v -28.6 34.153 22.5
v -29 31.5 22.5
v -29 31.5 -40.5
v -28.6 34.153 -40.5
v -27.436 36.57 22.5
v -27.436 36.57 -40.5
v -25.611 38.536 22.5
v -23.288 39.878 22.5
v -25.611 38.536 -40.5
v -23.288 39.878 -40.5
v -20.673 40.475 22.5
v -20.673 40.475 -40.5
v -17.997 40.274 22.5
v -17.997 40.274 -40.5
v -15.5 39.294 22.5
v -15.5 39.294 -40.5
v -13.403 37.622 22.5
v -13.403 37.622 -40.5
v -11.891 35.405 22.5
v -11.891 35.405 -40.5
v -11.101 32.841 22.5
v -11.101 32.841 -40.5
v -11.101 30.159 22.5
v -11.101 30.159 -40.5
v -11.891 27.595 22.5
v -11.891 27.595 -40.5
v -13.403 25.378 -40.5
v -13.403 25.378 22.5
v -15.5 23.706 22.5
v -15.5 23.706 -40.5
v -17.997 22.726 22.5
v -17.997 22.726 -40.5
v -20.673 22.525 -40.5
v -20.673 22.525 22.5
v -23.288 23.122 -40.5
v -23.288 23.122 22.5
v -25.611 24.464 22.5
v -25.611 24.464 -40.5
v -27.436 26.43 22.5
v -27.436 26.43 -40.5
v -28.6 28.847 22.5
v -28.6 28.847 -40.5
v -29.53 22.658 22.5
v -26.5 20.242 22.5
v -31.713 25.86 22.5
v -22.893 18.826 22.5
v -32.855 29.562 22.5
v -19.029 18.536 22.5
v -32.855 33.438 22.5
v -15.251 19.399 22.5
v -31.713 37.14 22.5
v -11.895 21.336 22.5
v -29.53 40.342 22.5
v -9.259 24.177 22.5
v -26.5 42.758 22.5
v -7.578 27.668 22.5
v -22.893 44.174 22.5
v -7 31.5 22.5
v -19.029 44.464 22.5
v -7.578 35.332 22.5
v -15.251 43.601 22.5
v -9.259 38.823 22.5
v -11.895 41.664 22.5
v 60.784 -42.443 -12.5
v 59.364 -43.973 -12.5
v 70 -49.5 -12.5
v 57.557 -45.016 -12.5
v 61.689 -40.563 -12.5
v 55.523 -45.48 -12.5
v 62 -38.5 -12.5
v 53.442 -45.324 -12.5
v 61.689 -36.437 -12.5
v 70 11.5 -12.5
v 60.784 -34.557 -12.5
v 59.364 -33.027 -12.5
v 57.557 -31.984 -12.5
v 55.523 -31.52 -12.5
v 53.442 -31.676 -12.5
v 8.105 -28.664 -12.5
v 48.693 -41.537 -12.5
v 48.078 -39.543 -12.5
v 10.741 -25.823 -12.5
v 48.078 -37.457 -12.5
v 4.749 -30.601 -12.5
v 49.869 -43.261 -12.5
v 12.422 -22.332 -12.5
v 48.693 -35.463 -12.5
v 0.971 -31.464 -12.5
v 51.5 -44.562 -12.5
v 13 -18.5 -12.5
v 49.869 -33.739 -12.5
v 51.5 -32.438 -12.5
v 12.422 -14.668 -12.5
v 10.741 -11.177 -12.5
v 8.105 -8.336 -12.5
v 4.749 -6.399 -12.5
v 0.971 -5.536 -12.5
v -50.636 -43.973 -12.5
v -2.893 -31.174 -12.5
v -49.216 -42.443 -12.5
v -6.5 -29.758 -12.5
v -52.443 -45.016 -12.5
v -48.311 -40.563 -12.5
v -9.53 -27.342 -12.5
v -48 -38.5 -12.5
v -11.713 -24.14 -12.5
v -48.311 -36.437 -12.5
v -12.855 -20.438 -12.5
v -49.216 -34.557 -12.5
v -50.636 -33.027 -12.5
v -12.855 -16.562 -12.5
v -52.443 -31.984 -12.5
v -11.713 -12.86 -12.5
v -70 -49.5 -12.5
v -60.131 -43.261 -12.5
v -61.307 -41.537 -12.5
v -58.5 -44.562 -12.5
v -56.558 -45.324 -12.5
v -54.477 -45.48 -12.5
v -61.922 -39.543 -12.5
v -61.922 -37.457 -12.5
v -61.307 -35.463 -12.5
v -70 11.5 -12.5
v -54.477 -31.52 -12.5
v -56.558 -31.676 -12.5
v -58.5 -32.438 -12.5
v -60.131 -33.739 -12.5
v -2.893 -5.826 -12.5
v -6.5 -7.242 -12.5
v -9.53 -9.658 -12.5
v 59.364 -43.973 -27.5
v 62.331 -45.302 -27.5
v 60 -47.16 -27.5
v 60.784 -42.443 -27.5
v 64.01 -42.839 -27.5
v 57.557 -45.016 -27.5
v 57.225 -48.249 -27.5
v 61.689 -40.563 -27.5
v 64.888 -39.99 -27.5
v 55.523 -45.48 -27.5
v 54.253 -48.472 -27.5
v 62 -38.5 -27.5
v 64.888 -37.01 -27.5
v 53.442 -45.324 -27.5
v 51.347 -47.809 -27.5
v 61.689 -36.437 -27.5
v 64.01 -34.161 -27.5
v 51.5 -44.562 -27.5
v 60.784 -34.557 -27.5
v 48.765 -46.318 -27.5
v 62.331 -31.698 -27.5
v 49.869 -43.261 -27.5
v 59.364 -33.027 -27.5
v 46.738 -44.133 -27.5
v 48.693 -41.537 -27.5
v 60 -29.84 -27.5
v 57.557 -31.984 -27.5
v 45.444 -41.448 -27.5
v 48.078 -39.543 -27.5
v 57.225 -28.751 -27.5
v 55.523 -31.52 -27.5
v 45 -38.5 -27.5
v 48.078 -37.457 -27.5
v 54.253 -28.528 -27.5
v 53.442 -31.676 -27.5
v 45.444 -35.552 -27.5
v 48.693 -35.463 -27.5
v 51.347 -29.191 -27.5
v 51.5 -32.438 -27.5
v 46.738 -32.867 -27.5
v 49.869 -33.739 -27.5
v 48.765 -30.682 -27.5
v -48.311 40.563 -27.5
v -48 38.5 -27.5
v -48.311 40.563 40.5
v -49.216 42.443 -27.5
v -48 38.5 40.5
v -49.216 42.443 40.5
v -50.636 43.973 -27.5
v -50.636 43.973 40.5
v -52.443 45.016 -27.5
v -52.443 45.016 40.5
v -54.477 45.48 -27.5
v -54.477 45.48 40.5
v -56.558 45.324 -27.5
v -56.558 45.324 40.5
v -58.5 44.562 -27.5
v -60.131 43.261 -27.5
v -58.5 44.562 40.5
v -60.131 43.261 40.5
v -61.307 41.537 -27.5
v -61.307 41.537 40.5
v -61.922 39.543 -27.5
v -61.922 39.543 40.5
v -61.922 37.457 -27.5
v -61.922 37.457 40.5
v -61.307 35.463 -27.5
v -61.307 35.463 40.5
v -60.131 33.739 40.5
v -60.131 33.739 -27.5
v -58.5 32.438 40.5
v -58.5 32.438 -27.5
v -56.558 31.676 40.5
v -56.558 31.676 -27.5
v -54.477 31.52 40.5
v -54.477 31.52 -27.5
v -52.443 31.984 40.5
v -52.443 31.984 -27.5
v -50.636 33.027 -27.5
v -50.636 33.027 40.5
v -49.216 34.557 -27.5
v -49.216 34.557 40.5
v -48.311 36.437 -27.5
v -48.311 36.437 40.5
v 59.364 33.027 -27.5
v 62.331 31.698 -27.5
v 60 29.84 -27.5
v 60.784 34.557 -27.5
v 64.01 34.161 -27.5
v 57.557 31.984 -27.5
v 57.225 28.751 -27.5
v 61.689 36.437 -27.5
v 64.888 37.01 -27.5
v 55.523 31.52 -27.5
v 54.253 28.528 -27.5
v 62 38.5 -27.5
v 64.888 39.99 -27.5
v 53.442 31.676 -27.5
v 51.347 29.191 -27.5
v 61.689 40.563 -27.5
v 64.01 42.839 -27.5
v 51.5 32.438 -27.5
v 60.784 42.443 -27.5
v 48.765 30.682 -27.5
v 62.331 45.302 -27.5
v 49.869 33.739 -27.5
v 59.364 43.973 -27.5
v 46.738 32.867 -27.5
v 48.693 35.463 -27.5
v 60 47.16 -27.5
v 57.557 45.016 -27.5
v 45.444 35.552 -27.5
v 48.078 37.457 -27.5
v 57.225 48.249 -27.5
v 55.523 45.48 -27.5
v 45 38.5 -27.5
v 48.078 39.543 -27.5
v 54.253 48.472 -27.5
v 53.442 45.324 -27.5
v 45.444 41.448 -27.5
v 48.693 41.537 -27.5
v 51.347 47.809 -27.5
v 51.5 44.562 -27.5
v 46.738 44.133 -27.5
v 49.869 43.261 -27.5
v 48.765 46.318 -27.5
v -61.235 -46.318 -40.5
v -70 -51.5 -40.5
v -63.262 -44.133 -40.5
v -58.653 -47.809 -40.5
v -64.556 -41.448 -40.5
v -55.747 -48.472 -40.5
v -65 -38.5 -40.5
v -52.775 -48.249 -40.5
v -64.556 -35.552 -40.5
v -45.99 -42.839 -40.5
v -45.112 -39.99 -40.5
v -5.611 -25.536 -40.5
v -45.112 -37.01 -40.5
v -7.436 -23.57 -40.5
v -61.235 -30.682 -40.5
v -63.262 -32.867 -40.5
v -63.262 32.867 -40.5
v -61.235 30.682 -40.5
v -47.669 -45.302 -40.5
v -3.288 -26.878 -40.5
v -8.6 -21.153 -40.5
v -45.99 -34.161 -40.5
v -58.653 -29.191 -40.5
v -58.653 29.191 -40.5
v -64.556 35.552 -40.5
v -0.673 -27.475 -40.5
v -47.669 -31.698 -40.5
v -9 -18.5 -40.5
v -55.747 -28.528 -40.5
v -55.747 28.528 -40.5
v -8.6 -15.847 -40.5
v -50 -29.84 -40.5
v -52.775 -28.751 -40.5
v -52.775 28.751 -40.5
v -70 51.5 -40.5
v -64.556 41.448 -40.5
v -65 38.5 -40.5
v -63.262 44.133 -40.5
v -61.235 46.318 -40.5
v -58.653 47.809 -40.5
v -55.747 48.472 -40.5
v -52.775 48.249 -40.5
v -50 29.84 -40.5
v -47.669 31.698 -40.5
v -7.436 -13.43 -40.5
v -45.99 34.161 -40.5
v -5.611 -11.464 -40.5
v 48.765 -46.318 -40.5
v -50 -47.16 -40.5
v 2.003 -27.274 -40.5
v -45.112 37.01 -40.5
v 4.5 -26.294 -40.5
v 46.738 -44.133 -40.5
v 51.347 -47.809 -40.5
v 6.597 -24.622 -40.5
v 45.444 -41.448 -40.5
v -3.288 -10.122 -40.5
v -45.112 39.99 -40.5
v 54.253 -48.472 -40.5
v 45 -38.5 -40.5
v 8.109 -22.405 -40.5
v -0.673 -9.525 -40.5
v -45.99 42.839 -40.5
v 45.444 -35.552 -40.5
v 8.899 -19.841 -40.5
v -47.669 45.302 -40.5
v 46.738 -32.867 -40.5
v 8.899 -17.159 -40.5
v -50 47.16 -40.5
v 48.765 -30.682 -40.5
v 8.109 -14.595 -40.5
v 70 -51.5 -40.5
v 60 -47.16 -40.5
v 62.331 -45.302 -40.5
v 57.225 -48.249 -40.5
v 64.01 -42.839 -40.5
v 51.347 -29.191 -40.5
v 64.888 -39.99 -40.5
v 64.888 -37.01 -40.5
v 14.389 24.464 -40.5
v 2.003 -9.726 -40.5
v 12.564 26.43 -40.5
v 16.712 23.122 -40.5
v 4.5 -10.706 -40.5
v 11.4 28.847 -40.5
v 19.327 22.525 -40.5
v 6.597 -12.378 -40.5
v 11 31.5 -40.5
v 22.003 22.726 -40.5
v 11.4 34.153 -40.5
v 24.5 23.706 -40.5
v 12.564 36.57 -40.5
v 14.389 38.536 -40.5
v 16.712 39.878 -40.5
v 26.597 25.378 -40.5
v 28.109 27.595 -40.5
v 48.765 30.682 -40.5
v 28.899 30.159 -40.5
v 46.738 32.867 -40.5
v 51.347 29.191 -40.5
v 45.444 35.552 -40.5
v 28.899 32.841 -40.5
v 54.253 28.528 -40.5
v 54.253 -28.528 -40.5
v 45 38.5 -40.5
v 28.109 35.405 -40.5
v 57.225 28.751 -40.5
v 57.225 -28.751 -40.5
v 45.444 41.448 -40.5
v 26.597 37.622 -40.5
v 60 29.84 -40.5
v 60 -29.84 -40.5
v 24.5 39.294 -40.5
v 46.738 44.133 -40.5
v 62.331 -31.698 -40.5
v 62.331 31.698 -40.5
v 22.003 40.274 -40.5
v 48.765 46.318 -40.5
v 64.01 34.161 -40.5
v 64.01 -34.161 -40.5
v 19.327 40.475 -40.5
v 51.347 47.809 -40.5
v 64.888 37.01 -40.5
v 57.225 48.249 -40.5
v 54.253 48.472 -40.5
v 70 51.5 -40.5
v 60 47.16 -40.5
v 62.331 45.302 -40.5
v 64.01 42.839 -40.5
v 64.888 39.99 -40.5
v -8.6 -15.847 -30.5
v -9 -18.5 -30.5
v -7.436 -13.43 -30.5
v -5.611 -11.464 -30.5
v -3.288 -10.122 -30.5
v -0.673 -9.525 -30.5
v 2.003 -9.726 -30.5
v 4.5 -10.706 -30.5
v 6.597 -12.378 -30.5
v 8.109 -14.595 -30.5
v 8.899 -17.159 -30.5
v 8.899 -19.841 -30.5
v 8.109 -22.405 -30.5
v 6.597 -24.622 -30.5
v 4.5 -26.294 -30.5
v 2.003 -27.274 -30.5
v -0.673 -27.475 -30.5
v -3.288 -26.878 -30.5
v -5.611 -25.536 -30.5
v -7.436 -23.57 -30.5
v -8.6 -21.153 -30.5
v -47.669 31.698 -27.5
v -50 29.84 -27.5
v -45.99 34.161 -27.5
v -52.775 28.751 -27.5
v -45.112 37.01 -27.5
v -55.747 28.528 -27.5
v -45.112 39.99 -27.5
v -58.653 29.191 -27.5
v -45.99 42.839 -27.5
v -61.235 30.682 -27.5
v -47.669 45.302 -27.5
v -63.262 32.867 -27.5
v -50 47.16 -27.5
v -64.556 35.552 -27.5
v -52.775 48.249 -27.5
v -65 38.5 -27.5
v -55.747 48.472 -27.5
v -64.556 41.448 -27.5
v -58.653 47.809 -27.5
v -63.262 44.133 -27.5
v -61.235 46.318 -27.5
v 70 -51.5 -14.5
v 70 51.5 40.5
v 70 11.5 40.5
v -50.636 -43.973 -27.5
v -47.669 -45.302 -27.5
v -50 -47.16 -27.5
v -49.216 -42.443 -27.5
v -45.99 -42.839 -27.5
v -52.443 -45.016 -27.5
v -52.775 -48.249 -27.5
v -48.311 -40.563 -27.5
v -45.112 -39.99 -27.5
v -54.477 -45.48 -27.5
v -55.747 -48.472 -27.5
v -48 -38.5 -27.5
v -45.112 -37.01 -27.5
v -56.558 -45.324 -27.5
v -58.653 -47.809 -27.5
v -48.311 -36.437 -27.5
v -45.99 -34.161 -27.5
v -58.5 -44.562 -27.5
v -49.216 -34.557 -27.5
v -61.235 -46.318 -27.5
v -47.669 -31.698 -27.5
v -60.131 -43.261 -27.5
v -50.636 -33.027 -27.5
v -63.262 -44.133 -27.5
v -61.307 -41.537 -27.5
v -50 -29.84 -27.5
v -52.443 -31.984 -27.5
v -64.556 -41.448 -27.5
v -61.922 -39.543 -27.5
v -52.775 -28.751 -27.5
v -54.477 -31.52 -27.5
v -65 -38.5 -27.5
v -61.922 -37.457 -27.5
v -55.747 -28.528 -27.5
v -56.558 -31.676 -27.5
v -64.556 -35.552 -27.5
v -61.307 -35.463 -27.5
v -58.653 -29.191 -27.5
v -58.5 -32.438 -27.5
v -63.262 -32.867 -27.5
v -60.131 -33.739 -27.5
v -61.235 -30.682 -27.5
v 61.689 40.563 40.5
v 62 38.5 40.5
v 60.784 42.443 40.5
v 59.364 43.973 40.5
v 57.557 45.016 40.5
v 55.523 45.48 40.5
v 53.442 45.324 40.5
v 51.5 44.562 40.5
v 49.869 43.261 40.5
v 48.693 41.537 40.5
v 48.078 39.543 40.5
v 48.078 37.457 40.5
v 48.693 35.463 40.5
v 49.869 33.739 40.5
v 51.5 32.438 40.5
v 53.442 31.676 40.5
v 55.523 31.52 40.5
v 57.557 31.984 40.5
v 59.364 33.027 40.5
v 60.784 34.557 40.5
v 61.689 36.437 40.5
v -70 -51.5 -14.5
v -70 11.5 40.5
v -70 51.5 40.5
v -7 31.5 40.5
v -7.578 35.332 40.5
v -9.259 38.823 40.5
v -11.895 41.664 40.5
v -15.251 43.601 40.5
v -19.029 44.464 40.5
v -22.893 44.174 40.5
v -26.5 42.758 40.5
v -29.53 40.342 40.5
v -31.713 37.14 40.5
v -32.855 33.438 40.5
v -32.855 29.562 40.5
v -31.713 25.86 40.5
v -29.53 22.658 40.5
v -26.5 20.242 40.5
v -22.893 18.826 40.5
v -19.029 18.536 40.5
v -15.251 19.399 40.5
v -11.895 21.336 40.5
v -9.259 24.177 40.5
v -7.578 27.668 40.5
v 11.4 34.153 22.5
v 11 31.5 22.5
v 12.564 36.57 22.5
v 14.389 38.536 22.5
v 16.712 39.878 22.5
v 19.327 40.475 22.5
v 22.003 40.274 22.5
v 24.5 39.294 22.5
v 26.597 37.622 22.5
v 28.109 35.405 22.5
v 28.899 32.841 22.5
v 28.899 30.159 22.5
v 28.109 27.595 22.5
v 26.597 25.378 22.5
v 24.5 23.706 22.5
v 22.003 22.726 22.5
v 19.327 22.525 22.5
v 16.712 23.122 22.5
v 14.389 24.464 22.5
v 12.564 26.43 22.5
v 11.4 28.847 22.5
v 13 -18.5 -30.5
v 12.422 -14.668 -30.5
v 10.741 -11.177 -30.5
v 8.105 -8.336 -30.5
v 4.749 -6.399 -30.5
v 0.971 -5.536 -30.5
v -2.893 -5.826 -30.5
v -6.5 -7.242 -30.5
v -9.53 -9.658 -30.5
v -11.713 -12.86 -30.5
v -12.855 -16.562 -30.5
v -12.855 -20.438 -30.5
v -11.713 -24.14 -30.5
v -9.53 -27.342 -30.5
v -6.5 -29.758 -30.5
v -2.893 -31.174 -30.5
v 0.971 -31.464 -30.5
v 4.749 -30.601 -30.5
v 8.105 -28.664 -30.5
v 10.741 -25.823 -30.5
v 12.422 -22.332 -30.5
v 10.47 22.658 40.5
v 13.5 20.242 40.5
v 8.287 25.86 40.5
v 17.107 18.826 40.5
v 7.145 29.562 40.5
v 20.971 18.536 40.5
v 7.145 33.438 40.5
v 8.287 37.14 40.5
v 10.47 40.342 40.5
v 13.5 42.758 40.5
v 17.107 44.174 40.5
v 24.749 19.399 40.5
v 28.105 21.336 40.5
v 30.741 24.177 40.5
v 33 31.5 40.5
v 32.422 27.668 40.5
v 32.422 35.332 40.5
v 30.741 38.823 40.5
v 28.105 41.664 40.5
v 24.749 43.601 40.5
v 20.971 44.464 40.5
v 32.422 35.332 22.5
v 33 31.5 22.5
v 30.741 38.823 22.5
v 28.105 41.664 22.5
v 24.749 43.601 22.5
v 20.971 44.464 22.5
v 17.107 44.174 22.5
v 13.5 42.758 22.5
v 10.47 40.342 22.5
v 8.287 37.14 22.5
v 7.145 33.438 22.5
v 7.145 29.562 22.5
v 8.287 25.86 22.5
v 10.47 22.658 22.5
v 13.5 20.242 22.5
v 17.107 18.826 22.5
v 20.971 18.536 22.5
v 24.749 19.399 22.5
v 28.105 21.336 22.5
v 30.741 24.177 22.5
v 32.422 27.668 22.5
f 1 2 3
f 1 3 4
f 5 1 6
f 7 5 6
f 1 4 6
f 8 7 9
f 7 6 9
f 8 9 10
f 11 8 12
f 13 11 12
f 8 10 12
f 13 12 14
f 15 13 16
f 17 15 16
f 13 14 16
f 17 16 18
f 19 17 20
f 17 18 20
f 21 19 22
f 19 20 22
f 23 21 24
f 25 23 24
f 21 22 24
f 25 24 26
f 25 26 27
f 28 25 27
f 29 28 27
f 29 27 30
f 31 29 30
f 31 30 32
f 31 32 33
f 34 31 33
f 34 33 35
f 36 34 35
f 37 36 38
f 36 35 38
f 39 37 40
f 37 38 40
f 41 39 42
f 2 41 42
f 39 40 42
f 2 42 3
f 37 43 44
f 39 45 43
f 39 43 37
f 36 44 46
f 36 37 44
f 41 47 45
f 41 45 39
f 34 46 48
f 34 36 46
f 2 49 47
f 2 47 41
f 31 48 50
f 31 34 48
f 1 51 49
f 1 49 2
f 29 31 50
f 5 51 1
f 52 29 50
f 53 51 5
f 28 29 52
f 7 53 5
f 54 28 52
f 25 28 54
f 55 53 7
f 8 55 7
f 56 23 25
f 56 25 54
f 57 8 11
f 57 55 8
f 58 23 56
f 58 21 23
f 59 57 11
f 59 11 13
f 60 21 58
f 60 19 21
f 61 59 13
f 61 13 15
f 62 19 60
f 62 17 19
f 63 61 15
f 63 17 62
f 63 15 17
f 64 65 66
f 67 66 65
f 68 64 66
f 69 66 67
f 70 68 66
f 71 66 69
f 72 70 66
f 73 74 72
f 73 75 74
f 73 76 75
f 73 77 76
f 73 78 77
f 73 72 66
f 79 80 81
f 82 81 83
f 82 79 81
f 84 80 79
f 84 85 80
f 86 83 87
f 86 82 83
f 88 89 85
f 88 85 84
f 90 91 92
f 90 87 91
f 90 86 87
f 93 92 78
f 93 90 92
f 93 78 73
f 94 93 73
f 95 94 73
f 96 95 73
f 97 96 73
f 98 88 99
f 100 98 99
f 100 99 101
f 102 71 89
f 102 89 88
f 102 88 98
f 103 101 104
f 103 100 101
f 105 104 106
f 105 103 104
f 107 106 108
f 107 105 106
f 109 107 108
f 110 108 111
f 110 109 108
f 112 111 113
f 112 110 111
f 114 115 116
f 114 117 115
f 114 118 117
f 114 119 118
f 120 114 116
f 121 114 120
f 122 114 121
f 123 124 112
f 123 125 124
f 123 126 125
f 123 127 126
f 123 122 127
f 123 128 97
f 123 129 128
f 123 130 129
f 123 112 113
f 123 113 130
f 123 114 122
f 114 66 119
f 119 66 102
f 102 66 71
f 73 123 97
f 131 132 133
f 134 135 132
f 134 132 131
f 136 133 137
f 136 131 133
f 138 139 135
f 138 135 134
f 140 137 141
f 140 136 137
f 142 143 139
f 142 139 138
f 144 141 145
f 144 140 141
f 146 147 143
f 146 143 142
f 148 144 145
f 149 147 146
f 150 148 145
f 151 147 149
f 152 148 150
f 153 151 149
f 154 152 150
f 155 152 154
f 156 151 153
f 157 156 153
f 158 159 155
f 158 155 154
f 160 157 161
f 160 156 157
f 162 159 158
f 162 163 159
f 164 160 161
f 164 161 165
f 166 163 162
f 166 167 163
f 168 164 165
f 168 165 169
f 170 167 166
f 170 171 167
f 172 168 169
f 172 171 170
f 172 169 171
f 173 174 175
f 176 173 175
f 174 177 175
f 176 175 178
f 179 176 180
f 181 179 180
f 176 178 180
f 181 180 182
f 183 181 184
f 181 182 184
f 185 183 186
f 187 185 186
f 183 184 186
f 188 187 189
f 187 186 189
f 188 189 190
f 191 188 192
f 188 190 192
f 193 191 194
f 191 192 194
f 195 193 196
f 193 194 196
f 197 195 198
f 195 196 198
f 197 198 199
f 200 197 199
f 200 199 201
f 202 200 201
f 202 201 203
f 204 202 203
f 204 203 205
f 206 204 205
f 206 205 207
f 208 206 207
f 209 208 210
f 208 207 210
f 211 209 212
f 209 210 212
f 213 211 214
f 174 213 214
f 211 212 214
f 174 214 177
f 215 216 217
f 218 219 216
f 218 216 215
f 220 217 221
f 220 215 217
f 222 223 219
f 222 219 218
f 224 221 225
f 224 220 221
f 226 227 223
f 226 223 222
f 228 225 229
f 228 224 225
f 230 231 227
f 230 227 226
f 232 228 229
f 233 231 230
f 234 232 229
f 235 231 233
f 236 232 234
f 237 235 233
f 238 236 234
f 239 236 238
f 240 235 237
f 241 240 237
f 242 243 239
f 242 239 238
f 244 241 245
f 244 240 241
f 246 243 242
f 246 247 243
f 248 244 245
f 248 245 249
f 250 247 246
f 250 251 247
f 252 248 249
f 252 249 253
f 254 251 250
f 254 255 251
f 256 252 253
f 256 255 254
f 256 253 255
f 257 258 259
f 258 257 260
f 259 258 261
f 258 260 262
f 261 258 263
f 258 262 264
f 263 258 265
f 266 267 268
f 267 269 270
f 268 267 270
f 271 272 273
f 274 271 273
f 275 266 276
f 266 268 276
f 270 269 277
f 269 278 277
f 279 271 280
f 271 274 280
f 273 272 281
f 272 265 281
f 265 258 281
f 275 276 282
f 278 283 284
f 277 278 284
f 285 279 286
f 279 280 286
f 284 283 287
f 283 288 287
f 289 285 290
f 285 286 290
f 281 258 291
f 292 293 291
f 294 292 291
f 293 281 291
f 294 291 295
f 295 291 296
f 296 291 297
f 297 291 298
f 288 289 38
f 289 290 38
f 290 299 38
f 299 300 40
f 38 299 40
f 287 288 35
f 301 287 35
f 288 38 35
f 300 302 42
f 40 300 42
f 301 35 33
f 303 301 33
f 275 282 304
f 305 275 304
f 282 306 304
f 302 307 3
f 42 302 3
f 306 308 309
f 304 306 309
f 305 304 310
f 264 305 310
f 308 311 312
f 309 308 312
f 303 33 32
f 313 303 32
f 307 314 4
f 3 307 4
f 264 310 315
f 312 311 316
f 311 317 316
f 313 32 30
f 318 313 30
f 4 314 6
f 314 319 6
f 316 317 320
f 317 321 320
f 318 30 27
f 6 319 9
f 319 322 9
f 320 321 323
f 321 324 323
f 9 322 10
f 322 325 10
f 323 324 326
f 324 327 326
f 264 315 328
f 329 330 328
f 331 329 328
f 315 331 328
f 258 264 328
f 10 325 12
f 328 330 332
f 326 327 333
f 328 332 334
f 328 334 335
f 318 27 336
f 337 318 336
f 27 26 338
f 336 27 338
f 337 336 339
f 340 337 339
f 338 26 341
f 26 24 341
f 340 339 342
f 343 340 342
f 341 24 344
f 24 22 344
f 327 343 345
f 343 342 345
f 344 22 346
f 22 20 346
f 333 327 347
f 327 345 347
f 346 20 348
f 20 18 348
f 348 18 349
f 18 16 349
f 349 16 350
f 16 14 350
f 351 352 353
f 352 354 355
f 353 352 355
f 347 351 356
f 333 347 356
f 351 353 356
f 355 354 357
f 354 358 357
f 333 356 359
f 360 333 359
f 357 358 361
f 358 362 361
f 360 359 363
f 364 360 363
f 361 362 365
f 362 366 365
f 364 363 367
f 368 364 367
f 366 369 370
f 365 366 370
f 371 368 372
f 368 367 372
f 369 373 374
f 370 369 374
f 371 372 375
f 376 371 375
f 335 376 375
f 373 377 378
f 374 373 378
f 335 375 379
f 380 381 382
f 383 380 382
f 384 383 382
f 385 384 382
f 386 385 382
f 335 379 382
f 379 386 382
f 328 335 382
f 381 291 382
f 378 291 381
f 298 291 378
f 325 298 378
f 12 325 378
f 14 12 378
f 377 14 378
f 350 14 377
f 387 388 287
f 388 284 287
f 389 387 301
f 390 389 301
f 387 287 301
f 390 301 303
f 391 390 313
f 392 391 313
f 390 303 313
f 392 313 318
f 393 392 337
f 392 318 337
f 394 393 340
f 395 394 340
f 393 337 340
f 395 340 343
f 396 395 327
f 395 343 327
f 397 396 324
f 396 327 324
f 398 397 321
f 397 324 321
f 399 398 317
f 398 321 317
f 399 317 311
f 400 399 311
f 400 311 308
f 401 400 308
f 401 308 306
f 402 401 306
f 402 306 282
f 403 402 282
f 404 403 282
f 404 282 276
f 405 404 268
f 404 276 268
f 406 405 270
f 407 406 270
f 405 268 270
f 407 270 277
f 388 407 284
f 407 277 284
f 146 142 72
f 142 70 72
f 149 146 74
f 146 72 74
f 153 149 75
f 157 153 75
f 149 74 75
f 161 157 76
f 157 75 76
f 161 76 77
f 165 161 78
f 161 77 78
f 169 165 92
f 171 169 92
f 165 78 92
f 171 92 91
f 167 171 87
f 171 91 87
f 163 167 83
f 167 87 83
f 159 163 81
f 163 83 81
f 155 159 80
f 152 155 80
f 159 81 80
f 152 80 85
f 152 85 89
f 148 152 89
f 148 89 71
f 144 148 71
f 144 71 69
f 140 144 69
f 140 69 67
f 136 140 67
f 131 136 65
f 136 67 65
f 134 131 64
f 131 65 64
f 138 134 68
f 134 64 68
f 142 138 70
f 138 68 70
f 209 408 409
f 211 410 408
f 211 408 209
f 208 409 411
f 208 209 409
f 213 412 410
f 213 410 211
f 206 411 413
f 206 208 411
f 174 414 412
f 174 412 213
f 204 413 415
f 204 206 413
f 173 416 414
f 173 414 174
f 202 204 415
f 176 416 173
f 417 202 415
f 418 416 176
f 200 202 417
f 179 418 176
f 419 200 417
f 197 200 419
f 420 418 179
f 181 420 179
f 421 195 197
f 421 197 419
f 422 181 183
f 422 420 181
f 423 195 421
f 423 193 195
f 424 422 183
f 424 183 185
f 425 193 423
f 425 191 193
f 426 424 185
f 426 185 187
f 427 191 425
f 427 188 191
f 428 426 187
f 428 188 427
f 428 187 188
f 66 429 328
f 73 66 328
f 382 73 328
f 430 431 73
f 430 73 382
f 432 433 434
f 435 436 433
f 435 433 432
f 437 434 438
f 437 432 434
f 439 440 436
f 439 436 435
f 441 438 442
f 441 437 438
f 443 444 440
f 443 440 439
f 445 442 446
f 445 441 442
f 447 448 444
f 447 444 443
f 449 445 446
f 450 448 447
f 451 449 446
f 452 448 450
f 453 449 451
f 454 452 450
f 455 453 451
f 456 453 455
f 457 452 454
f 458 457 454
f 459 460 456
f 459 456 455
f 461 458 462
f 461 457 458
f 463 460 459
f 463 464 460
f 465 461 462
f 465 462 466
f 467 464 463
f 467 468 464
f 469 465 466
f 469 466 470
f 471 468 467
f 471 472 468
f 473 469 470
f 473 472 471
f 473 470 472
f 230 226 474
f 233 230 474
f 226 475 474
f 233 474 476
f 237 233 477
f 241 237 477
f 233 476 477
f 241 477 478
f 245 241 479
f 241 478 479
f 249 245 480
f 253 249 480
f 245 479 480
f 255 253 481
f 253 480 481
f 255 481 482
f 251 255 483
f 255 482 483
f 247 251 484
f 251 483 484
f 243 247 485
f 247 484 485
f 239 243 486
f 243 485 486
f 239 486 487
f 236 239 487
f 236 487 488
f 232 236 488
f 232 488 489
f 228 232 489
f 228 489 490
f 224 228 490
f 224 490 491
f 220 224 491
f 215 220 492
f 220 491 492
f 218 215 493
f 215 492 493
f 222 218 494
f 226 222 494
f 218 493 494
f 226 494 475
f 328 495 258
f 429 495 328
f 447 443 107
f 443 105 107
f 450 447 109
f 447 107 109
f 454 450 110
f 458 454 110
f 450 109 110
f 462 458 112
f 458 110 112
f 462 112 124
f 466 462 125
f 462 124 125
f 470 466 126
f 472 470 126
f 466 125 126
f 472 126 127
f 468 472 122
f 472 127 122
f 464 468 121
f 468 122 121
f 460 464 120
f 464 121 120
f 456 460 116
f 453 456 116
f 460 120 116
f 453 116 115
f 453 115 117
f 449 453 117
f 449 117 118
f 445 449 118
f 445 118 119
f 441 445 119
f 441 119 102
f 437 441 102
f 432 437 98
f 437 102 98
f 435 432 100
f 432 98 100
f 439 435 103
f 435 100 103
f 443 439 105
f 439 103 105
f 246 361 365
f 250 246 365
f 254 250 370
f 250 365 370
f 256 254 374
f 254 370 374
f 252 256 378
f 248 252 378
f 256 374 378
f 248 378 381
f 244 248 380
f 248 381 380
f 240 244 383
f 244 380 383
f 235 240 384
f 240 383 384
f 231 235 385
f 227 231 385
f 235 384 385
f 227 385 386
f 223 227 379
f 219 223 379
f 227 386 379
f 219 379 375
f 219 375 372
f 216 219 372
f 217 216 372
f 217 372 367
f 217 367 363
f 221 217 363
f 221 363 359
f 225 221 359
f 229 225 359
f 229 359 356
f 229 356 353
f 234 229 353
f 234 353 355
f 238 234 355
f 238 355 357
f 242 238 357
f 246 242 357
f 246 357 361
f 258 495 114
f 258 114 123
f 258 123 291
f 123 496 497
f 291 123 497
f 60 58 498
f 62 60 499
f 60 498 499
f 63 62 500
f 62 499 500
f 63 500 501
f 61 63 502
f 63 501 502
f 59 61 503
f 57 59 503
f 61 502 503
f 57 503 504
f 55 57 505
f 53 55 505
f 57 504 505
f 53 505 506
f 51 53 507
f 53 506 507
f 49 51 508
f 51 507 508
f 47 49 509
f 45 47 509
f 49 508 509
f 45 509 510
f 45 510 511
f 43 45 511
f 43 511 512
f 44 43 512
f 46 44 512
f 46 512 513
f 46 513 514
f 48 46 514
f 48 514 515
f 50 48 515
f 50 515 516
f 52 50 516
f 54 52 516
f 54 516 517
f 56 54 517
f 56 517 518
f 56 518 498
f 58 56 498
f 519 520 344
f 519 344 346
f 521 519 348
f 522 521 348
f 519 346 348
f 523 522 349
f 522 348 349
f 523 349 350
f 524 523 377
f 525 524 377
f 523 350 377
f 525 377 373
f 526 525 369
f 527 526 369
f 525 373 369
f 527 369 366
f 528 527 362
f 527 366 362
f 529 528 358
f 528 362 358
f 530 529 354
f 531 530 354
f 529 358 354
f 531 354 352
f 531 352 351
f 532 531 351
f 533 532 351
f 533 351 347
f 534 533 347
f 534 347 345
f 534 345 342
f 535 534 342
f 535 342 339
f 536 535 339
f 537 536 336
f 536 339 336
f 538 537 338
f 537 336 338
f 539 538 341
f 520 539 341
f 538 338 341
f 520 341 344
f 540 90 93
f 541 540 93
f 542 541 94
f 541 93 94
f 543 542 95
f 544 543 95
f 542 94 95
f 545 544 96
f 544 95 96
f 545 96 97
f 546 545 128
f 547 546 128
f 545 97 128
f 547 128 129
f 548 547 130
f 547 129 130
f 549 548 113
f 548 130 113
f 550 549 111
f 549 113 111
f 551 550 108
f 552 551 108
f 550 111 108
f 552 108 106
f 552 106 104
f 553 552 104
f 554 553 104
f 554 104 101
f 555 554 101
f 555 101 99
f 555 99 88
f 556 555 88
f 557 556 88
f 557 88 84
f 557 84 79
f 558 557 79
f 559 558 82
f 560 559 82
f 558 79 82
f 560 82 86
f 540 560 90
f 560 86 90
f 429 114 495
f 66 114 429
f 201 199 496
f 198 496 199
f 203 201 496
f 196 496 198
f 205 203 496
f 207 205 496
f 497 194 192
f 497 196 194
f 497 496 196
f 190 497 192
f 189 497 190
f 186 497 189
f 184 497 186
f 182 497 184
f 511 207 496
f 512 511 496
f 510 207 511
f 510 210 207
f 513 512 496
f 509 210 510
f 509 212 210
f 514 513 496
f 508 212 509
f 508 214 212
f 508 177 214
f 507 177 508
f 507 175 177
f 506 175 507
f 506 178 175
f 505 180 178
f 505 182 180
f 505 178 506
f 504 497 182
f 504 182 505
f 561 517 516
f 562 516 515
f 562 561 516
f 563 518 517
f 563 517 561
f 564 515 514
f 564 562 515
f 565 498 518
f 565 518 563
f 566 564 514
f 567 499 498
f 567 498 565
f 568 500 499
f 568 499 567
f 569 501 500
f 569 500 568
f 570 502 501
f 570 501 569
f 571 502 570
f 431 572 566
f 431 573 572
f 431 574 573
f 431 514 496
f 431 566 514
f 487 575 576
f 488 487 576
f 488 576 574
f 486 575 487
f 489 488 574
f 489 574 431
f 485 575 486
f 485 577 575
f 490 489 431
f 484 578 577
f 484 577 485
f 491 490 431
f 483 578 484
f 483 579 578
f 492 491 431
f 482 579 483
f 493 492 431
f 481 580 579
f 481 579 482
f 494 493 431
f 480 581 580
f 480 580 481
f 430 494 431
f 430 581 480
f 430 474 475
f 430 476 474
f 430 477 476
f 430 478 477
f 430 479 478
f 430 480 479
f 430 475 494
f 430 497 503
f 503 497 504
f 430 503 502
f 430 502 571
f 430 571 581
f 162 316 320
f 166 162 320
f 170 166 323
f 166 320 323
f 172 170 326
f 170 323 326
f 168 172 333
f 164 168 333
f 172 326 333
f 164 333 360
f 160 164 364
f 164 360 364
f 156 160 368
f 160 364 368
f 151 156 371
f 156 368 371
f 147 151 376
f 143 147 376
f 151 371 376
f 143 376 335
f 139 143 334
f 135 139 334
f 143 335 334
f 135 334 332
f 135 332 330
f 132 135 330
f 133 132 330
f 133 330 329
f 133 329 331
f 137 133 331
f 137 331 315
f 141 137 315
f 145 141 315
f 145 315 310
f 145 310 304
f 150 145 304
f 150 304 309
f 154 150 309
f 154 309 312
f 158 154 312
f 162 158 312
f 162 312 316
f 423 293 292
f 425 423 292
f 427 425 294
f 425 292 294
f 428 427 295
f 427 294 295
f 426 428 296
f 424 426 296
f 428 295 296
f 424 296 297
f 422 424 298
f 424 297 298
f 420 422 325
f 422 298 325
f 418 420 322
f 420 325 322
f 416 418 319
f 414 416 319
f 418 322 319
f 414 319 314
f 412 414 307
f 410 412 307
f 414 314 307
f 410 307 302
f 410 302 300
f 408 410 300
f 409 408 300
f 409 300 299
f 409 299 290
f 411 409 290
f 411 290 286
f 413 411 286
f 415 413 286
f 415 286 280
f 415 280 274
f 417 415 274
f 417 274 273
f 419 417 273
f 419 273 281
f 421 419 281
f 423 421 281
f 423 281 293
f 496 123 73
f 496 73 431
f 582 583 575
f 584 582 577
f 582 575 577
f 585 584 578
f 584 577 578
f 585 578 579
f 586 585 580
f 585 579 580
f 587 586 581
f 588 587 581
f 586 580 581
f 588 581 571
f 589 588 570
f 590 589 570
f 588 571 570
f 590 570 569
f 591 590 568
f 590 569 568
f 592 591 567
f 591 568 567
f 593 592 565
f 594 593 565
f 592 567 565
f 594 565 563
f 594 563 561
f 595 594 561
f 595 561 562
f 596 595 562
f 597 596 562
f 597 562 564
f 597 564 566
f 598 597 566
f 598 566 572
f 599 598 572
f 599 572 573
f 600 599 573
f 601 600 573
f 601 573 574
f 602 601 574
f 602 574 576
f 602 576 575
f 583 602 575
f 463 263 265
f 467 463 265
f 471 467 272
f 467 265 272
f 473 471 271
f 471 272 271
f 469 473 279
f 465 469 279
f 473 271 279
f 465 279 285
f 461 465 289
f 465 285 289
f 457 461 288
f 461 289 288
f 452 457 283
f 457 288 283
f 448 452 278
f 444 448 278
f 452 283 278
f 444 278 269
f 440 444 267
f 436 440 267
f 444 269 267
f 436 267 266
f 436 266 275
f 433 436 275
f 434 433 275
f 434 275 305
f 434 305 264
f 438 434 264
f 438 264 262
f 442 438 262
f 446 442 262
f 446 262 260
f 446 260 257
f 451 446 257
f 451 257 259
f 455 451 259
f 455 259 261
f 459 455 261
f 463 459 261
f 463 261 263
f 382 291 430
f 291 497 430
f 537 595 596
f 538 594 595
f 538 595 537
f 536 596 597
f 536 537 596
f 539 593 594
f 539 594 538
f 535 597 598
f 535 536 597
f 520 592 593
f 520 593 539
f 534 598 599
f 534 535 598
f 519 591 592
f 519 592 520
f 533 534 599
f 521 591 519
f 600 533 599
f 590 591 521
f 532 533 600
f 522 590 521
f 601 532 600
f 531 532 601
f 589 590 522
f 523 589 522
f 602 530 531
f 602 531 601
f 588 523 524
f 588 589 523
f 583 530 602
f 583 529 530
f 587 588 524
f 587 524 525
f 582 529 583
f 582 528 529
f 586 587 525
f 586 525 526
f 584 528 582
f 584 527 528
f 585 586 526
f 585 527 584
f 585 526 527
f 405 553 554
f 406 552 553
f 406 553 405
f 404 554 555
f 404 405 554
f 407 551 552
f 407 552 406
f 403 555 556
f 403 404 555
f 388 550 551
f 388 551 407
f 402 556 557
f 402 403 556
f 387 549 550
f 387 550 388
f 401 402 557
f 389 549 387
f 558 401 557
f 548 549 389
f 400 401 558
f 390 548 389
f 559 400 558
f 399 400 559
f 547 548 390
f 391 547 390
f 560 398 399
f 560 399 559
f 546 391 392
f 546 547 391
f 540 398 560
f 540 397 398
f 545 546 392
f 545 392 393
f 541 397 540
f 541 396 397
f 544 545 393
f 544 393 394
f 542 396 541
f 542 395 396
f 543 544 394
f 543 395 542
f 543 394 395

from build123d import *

# Parameters (mm, degrees)
SKIZZE1_W                                            = 140
SKIZZE1_H                                            = 103
BASIS_LINEAR_AUSTRAGEN_DEPTH                         = 40.5
SKIZZE8_W                                            = 53
SKIZZE8_H                                            = 63
SCHNITT_LINEAR_AUSTRAGEN1_DEPTH                      = 155.571989701
BOHRUNG1_D                                           = 18
BOHRUNG1_DEPTH                                       = 90
BOHRUNG1_CBORE_D                                     = 26
BOHRUNG1_CBORE_DEPTH                                 = 18
BOHRUNG2_D                                           = 18
BOHRUNG2_DEPTH                                       = 90
BOHRUNG2_CBORE_D                                     = 26
BOHRUNG2_CBORE_DEPTH                                 = 18
LINEARES_MUSTER1_COUNT                               = 2
LINEARES_MUSTER1_PITCH                               = 40
STIRNSENKUNG_F_R_M8_FLACHKOPFSCHRAUBE_MI_D           = 14
STIRNSENKUNG_F_R_M8_FLACHKOPFSCHRAUBE_MI_CBORE_D     = 20
STIRNSENKUNG_F_R_M8_FLACHKOPFSCHRAUBE_MI_CBORE_DEPTH = 13
SKIZZE11_R                                           = 13
SCHNITT_LINEAR_AUSTRAGEN2_DEPTH                      = 18
FASE1_SIZE                                           = 2


with BuildPart() as part:
    # Skizze1 → Basis-Linear austragen (new, symmetric)
    with BuildSketch(Plane.XY):
        Rectangle(SKIZZE1_W, SKIZZE1_H)
    extrude(amount=BASIS_LINEAR_AUSTRAGEN_DEPTH, both=True)

    # Skizze8 → Schnitt-Linear austragen1 (cut, through all)
    with BuildSketch(Plane.ZY.offset(70)):
        with Locations((14, -20)):
            Rectangle(SKIZZE8_W, SKIZZE8_H)
    extrude(amount=-SCHNITT_LINEAR_AUSTRAGEN1_DEPTH, mode=Mode.SUBTRACT)

    # Bohrung1
    with Locations(Plane.XY.offset(40.5)):
        with Locations((0, -18.5)):
            CounterBoreHole(BOHRUNG1_D / 2, BOHRUNG1_CBORE_D / 2, BOHRUNG1_CBORE_DEPTH, depth=BOHRUNG1_DEPTH)

    # Bohrung2
    with Locations(Plane.XY.offset(40.5)):
        with Locations((20, 31.5)):
            bohrung2 = CounterBoreHole(BOHRUNG2_D / 2, BOHRUNG2_CBORE_D / 2, BOHRUNG2_CBORE_DEPTH, depth=BOHRUNG2_DEPTH)

    # Lineares Muster1: Bohrung2 ×2
    with Locations(*[(-i * LINEARES_MUSTER1_PITCH, 0, 0) for i in range(1, LINEARES_MUSTER1_COUNT)]):
        add(bohrung2, mode=Mode.SUBTRACT)

    # Stirnsenkung für M8 Flachkopfschraube mit Schlitz1 (through all)
    with Locations(Plane(origin=(0, 0, -40.5), x_dir=(-1, 0, 0), z_dir=(0, 0, -1))):
        with Locations((-55, -38.5), (-55, 38.5), (55, 38.5), (55, -38.5)):
            CounterBoreHole(STIRNSENKUNG_F_R_M8_FLACHKOPFSCHRAUBE_MI_D / 2, STIRNSENKUNG_F_R_M8_FLACHKOPFSCHRAUBE_MI_CBORE_D / 2, STIRNSENKUNG_F_R_M8_FLACHKOPFSCHRAUBE_MI_CBORE_DEPTH)

    # Skizze11 → Schnitt-Linear austragen2 (cut)
    with BuildSketch(Plane.XY.offset(-12.5)):
        with Locations((0, -18.5)):
            Circle(SKIZZE11_R)
    extrude(amount=-SCHNITT_LINEAR_AUSTRAGEN2_DEPTH, mode=Mode.SUBTRACT)

    # Fase1
    fase1_edges = [part.edges().sort_by_distance(p)[0] for p in [
        (0, -51.5, -12.5),
    ]]
    chamfer(fase1_edges, length=FASE1_SIZE)


solid = part.part
